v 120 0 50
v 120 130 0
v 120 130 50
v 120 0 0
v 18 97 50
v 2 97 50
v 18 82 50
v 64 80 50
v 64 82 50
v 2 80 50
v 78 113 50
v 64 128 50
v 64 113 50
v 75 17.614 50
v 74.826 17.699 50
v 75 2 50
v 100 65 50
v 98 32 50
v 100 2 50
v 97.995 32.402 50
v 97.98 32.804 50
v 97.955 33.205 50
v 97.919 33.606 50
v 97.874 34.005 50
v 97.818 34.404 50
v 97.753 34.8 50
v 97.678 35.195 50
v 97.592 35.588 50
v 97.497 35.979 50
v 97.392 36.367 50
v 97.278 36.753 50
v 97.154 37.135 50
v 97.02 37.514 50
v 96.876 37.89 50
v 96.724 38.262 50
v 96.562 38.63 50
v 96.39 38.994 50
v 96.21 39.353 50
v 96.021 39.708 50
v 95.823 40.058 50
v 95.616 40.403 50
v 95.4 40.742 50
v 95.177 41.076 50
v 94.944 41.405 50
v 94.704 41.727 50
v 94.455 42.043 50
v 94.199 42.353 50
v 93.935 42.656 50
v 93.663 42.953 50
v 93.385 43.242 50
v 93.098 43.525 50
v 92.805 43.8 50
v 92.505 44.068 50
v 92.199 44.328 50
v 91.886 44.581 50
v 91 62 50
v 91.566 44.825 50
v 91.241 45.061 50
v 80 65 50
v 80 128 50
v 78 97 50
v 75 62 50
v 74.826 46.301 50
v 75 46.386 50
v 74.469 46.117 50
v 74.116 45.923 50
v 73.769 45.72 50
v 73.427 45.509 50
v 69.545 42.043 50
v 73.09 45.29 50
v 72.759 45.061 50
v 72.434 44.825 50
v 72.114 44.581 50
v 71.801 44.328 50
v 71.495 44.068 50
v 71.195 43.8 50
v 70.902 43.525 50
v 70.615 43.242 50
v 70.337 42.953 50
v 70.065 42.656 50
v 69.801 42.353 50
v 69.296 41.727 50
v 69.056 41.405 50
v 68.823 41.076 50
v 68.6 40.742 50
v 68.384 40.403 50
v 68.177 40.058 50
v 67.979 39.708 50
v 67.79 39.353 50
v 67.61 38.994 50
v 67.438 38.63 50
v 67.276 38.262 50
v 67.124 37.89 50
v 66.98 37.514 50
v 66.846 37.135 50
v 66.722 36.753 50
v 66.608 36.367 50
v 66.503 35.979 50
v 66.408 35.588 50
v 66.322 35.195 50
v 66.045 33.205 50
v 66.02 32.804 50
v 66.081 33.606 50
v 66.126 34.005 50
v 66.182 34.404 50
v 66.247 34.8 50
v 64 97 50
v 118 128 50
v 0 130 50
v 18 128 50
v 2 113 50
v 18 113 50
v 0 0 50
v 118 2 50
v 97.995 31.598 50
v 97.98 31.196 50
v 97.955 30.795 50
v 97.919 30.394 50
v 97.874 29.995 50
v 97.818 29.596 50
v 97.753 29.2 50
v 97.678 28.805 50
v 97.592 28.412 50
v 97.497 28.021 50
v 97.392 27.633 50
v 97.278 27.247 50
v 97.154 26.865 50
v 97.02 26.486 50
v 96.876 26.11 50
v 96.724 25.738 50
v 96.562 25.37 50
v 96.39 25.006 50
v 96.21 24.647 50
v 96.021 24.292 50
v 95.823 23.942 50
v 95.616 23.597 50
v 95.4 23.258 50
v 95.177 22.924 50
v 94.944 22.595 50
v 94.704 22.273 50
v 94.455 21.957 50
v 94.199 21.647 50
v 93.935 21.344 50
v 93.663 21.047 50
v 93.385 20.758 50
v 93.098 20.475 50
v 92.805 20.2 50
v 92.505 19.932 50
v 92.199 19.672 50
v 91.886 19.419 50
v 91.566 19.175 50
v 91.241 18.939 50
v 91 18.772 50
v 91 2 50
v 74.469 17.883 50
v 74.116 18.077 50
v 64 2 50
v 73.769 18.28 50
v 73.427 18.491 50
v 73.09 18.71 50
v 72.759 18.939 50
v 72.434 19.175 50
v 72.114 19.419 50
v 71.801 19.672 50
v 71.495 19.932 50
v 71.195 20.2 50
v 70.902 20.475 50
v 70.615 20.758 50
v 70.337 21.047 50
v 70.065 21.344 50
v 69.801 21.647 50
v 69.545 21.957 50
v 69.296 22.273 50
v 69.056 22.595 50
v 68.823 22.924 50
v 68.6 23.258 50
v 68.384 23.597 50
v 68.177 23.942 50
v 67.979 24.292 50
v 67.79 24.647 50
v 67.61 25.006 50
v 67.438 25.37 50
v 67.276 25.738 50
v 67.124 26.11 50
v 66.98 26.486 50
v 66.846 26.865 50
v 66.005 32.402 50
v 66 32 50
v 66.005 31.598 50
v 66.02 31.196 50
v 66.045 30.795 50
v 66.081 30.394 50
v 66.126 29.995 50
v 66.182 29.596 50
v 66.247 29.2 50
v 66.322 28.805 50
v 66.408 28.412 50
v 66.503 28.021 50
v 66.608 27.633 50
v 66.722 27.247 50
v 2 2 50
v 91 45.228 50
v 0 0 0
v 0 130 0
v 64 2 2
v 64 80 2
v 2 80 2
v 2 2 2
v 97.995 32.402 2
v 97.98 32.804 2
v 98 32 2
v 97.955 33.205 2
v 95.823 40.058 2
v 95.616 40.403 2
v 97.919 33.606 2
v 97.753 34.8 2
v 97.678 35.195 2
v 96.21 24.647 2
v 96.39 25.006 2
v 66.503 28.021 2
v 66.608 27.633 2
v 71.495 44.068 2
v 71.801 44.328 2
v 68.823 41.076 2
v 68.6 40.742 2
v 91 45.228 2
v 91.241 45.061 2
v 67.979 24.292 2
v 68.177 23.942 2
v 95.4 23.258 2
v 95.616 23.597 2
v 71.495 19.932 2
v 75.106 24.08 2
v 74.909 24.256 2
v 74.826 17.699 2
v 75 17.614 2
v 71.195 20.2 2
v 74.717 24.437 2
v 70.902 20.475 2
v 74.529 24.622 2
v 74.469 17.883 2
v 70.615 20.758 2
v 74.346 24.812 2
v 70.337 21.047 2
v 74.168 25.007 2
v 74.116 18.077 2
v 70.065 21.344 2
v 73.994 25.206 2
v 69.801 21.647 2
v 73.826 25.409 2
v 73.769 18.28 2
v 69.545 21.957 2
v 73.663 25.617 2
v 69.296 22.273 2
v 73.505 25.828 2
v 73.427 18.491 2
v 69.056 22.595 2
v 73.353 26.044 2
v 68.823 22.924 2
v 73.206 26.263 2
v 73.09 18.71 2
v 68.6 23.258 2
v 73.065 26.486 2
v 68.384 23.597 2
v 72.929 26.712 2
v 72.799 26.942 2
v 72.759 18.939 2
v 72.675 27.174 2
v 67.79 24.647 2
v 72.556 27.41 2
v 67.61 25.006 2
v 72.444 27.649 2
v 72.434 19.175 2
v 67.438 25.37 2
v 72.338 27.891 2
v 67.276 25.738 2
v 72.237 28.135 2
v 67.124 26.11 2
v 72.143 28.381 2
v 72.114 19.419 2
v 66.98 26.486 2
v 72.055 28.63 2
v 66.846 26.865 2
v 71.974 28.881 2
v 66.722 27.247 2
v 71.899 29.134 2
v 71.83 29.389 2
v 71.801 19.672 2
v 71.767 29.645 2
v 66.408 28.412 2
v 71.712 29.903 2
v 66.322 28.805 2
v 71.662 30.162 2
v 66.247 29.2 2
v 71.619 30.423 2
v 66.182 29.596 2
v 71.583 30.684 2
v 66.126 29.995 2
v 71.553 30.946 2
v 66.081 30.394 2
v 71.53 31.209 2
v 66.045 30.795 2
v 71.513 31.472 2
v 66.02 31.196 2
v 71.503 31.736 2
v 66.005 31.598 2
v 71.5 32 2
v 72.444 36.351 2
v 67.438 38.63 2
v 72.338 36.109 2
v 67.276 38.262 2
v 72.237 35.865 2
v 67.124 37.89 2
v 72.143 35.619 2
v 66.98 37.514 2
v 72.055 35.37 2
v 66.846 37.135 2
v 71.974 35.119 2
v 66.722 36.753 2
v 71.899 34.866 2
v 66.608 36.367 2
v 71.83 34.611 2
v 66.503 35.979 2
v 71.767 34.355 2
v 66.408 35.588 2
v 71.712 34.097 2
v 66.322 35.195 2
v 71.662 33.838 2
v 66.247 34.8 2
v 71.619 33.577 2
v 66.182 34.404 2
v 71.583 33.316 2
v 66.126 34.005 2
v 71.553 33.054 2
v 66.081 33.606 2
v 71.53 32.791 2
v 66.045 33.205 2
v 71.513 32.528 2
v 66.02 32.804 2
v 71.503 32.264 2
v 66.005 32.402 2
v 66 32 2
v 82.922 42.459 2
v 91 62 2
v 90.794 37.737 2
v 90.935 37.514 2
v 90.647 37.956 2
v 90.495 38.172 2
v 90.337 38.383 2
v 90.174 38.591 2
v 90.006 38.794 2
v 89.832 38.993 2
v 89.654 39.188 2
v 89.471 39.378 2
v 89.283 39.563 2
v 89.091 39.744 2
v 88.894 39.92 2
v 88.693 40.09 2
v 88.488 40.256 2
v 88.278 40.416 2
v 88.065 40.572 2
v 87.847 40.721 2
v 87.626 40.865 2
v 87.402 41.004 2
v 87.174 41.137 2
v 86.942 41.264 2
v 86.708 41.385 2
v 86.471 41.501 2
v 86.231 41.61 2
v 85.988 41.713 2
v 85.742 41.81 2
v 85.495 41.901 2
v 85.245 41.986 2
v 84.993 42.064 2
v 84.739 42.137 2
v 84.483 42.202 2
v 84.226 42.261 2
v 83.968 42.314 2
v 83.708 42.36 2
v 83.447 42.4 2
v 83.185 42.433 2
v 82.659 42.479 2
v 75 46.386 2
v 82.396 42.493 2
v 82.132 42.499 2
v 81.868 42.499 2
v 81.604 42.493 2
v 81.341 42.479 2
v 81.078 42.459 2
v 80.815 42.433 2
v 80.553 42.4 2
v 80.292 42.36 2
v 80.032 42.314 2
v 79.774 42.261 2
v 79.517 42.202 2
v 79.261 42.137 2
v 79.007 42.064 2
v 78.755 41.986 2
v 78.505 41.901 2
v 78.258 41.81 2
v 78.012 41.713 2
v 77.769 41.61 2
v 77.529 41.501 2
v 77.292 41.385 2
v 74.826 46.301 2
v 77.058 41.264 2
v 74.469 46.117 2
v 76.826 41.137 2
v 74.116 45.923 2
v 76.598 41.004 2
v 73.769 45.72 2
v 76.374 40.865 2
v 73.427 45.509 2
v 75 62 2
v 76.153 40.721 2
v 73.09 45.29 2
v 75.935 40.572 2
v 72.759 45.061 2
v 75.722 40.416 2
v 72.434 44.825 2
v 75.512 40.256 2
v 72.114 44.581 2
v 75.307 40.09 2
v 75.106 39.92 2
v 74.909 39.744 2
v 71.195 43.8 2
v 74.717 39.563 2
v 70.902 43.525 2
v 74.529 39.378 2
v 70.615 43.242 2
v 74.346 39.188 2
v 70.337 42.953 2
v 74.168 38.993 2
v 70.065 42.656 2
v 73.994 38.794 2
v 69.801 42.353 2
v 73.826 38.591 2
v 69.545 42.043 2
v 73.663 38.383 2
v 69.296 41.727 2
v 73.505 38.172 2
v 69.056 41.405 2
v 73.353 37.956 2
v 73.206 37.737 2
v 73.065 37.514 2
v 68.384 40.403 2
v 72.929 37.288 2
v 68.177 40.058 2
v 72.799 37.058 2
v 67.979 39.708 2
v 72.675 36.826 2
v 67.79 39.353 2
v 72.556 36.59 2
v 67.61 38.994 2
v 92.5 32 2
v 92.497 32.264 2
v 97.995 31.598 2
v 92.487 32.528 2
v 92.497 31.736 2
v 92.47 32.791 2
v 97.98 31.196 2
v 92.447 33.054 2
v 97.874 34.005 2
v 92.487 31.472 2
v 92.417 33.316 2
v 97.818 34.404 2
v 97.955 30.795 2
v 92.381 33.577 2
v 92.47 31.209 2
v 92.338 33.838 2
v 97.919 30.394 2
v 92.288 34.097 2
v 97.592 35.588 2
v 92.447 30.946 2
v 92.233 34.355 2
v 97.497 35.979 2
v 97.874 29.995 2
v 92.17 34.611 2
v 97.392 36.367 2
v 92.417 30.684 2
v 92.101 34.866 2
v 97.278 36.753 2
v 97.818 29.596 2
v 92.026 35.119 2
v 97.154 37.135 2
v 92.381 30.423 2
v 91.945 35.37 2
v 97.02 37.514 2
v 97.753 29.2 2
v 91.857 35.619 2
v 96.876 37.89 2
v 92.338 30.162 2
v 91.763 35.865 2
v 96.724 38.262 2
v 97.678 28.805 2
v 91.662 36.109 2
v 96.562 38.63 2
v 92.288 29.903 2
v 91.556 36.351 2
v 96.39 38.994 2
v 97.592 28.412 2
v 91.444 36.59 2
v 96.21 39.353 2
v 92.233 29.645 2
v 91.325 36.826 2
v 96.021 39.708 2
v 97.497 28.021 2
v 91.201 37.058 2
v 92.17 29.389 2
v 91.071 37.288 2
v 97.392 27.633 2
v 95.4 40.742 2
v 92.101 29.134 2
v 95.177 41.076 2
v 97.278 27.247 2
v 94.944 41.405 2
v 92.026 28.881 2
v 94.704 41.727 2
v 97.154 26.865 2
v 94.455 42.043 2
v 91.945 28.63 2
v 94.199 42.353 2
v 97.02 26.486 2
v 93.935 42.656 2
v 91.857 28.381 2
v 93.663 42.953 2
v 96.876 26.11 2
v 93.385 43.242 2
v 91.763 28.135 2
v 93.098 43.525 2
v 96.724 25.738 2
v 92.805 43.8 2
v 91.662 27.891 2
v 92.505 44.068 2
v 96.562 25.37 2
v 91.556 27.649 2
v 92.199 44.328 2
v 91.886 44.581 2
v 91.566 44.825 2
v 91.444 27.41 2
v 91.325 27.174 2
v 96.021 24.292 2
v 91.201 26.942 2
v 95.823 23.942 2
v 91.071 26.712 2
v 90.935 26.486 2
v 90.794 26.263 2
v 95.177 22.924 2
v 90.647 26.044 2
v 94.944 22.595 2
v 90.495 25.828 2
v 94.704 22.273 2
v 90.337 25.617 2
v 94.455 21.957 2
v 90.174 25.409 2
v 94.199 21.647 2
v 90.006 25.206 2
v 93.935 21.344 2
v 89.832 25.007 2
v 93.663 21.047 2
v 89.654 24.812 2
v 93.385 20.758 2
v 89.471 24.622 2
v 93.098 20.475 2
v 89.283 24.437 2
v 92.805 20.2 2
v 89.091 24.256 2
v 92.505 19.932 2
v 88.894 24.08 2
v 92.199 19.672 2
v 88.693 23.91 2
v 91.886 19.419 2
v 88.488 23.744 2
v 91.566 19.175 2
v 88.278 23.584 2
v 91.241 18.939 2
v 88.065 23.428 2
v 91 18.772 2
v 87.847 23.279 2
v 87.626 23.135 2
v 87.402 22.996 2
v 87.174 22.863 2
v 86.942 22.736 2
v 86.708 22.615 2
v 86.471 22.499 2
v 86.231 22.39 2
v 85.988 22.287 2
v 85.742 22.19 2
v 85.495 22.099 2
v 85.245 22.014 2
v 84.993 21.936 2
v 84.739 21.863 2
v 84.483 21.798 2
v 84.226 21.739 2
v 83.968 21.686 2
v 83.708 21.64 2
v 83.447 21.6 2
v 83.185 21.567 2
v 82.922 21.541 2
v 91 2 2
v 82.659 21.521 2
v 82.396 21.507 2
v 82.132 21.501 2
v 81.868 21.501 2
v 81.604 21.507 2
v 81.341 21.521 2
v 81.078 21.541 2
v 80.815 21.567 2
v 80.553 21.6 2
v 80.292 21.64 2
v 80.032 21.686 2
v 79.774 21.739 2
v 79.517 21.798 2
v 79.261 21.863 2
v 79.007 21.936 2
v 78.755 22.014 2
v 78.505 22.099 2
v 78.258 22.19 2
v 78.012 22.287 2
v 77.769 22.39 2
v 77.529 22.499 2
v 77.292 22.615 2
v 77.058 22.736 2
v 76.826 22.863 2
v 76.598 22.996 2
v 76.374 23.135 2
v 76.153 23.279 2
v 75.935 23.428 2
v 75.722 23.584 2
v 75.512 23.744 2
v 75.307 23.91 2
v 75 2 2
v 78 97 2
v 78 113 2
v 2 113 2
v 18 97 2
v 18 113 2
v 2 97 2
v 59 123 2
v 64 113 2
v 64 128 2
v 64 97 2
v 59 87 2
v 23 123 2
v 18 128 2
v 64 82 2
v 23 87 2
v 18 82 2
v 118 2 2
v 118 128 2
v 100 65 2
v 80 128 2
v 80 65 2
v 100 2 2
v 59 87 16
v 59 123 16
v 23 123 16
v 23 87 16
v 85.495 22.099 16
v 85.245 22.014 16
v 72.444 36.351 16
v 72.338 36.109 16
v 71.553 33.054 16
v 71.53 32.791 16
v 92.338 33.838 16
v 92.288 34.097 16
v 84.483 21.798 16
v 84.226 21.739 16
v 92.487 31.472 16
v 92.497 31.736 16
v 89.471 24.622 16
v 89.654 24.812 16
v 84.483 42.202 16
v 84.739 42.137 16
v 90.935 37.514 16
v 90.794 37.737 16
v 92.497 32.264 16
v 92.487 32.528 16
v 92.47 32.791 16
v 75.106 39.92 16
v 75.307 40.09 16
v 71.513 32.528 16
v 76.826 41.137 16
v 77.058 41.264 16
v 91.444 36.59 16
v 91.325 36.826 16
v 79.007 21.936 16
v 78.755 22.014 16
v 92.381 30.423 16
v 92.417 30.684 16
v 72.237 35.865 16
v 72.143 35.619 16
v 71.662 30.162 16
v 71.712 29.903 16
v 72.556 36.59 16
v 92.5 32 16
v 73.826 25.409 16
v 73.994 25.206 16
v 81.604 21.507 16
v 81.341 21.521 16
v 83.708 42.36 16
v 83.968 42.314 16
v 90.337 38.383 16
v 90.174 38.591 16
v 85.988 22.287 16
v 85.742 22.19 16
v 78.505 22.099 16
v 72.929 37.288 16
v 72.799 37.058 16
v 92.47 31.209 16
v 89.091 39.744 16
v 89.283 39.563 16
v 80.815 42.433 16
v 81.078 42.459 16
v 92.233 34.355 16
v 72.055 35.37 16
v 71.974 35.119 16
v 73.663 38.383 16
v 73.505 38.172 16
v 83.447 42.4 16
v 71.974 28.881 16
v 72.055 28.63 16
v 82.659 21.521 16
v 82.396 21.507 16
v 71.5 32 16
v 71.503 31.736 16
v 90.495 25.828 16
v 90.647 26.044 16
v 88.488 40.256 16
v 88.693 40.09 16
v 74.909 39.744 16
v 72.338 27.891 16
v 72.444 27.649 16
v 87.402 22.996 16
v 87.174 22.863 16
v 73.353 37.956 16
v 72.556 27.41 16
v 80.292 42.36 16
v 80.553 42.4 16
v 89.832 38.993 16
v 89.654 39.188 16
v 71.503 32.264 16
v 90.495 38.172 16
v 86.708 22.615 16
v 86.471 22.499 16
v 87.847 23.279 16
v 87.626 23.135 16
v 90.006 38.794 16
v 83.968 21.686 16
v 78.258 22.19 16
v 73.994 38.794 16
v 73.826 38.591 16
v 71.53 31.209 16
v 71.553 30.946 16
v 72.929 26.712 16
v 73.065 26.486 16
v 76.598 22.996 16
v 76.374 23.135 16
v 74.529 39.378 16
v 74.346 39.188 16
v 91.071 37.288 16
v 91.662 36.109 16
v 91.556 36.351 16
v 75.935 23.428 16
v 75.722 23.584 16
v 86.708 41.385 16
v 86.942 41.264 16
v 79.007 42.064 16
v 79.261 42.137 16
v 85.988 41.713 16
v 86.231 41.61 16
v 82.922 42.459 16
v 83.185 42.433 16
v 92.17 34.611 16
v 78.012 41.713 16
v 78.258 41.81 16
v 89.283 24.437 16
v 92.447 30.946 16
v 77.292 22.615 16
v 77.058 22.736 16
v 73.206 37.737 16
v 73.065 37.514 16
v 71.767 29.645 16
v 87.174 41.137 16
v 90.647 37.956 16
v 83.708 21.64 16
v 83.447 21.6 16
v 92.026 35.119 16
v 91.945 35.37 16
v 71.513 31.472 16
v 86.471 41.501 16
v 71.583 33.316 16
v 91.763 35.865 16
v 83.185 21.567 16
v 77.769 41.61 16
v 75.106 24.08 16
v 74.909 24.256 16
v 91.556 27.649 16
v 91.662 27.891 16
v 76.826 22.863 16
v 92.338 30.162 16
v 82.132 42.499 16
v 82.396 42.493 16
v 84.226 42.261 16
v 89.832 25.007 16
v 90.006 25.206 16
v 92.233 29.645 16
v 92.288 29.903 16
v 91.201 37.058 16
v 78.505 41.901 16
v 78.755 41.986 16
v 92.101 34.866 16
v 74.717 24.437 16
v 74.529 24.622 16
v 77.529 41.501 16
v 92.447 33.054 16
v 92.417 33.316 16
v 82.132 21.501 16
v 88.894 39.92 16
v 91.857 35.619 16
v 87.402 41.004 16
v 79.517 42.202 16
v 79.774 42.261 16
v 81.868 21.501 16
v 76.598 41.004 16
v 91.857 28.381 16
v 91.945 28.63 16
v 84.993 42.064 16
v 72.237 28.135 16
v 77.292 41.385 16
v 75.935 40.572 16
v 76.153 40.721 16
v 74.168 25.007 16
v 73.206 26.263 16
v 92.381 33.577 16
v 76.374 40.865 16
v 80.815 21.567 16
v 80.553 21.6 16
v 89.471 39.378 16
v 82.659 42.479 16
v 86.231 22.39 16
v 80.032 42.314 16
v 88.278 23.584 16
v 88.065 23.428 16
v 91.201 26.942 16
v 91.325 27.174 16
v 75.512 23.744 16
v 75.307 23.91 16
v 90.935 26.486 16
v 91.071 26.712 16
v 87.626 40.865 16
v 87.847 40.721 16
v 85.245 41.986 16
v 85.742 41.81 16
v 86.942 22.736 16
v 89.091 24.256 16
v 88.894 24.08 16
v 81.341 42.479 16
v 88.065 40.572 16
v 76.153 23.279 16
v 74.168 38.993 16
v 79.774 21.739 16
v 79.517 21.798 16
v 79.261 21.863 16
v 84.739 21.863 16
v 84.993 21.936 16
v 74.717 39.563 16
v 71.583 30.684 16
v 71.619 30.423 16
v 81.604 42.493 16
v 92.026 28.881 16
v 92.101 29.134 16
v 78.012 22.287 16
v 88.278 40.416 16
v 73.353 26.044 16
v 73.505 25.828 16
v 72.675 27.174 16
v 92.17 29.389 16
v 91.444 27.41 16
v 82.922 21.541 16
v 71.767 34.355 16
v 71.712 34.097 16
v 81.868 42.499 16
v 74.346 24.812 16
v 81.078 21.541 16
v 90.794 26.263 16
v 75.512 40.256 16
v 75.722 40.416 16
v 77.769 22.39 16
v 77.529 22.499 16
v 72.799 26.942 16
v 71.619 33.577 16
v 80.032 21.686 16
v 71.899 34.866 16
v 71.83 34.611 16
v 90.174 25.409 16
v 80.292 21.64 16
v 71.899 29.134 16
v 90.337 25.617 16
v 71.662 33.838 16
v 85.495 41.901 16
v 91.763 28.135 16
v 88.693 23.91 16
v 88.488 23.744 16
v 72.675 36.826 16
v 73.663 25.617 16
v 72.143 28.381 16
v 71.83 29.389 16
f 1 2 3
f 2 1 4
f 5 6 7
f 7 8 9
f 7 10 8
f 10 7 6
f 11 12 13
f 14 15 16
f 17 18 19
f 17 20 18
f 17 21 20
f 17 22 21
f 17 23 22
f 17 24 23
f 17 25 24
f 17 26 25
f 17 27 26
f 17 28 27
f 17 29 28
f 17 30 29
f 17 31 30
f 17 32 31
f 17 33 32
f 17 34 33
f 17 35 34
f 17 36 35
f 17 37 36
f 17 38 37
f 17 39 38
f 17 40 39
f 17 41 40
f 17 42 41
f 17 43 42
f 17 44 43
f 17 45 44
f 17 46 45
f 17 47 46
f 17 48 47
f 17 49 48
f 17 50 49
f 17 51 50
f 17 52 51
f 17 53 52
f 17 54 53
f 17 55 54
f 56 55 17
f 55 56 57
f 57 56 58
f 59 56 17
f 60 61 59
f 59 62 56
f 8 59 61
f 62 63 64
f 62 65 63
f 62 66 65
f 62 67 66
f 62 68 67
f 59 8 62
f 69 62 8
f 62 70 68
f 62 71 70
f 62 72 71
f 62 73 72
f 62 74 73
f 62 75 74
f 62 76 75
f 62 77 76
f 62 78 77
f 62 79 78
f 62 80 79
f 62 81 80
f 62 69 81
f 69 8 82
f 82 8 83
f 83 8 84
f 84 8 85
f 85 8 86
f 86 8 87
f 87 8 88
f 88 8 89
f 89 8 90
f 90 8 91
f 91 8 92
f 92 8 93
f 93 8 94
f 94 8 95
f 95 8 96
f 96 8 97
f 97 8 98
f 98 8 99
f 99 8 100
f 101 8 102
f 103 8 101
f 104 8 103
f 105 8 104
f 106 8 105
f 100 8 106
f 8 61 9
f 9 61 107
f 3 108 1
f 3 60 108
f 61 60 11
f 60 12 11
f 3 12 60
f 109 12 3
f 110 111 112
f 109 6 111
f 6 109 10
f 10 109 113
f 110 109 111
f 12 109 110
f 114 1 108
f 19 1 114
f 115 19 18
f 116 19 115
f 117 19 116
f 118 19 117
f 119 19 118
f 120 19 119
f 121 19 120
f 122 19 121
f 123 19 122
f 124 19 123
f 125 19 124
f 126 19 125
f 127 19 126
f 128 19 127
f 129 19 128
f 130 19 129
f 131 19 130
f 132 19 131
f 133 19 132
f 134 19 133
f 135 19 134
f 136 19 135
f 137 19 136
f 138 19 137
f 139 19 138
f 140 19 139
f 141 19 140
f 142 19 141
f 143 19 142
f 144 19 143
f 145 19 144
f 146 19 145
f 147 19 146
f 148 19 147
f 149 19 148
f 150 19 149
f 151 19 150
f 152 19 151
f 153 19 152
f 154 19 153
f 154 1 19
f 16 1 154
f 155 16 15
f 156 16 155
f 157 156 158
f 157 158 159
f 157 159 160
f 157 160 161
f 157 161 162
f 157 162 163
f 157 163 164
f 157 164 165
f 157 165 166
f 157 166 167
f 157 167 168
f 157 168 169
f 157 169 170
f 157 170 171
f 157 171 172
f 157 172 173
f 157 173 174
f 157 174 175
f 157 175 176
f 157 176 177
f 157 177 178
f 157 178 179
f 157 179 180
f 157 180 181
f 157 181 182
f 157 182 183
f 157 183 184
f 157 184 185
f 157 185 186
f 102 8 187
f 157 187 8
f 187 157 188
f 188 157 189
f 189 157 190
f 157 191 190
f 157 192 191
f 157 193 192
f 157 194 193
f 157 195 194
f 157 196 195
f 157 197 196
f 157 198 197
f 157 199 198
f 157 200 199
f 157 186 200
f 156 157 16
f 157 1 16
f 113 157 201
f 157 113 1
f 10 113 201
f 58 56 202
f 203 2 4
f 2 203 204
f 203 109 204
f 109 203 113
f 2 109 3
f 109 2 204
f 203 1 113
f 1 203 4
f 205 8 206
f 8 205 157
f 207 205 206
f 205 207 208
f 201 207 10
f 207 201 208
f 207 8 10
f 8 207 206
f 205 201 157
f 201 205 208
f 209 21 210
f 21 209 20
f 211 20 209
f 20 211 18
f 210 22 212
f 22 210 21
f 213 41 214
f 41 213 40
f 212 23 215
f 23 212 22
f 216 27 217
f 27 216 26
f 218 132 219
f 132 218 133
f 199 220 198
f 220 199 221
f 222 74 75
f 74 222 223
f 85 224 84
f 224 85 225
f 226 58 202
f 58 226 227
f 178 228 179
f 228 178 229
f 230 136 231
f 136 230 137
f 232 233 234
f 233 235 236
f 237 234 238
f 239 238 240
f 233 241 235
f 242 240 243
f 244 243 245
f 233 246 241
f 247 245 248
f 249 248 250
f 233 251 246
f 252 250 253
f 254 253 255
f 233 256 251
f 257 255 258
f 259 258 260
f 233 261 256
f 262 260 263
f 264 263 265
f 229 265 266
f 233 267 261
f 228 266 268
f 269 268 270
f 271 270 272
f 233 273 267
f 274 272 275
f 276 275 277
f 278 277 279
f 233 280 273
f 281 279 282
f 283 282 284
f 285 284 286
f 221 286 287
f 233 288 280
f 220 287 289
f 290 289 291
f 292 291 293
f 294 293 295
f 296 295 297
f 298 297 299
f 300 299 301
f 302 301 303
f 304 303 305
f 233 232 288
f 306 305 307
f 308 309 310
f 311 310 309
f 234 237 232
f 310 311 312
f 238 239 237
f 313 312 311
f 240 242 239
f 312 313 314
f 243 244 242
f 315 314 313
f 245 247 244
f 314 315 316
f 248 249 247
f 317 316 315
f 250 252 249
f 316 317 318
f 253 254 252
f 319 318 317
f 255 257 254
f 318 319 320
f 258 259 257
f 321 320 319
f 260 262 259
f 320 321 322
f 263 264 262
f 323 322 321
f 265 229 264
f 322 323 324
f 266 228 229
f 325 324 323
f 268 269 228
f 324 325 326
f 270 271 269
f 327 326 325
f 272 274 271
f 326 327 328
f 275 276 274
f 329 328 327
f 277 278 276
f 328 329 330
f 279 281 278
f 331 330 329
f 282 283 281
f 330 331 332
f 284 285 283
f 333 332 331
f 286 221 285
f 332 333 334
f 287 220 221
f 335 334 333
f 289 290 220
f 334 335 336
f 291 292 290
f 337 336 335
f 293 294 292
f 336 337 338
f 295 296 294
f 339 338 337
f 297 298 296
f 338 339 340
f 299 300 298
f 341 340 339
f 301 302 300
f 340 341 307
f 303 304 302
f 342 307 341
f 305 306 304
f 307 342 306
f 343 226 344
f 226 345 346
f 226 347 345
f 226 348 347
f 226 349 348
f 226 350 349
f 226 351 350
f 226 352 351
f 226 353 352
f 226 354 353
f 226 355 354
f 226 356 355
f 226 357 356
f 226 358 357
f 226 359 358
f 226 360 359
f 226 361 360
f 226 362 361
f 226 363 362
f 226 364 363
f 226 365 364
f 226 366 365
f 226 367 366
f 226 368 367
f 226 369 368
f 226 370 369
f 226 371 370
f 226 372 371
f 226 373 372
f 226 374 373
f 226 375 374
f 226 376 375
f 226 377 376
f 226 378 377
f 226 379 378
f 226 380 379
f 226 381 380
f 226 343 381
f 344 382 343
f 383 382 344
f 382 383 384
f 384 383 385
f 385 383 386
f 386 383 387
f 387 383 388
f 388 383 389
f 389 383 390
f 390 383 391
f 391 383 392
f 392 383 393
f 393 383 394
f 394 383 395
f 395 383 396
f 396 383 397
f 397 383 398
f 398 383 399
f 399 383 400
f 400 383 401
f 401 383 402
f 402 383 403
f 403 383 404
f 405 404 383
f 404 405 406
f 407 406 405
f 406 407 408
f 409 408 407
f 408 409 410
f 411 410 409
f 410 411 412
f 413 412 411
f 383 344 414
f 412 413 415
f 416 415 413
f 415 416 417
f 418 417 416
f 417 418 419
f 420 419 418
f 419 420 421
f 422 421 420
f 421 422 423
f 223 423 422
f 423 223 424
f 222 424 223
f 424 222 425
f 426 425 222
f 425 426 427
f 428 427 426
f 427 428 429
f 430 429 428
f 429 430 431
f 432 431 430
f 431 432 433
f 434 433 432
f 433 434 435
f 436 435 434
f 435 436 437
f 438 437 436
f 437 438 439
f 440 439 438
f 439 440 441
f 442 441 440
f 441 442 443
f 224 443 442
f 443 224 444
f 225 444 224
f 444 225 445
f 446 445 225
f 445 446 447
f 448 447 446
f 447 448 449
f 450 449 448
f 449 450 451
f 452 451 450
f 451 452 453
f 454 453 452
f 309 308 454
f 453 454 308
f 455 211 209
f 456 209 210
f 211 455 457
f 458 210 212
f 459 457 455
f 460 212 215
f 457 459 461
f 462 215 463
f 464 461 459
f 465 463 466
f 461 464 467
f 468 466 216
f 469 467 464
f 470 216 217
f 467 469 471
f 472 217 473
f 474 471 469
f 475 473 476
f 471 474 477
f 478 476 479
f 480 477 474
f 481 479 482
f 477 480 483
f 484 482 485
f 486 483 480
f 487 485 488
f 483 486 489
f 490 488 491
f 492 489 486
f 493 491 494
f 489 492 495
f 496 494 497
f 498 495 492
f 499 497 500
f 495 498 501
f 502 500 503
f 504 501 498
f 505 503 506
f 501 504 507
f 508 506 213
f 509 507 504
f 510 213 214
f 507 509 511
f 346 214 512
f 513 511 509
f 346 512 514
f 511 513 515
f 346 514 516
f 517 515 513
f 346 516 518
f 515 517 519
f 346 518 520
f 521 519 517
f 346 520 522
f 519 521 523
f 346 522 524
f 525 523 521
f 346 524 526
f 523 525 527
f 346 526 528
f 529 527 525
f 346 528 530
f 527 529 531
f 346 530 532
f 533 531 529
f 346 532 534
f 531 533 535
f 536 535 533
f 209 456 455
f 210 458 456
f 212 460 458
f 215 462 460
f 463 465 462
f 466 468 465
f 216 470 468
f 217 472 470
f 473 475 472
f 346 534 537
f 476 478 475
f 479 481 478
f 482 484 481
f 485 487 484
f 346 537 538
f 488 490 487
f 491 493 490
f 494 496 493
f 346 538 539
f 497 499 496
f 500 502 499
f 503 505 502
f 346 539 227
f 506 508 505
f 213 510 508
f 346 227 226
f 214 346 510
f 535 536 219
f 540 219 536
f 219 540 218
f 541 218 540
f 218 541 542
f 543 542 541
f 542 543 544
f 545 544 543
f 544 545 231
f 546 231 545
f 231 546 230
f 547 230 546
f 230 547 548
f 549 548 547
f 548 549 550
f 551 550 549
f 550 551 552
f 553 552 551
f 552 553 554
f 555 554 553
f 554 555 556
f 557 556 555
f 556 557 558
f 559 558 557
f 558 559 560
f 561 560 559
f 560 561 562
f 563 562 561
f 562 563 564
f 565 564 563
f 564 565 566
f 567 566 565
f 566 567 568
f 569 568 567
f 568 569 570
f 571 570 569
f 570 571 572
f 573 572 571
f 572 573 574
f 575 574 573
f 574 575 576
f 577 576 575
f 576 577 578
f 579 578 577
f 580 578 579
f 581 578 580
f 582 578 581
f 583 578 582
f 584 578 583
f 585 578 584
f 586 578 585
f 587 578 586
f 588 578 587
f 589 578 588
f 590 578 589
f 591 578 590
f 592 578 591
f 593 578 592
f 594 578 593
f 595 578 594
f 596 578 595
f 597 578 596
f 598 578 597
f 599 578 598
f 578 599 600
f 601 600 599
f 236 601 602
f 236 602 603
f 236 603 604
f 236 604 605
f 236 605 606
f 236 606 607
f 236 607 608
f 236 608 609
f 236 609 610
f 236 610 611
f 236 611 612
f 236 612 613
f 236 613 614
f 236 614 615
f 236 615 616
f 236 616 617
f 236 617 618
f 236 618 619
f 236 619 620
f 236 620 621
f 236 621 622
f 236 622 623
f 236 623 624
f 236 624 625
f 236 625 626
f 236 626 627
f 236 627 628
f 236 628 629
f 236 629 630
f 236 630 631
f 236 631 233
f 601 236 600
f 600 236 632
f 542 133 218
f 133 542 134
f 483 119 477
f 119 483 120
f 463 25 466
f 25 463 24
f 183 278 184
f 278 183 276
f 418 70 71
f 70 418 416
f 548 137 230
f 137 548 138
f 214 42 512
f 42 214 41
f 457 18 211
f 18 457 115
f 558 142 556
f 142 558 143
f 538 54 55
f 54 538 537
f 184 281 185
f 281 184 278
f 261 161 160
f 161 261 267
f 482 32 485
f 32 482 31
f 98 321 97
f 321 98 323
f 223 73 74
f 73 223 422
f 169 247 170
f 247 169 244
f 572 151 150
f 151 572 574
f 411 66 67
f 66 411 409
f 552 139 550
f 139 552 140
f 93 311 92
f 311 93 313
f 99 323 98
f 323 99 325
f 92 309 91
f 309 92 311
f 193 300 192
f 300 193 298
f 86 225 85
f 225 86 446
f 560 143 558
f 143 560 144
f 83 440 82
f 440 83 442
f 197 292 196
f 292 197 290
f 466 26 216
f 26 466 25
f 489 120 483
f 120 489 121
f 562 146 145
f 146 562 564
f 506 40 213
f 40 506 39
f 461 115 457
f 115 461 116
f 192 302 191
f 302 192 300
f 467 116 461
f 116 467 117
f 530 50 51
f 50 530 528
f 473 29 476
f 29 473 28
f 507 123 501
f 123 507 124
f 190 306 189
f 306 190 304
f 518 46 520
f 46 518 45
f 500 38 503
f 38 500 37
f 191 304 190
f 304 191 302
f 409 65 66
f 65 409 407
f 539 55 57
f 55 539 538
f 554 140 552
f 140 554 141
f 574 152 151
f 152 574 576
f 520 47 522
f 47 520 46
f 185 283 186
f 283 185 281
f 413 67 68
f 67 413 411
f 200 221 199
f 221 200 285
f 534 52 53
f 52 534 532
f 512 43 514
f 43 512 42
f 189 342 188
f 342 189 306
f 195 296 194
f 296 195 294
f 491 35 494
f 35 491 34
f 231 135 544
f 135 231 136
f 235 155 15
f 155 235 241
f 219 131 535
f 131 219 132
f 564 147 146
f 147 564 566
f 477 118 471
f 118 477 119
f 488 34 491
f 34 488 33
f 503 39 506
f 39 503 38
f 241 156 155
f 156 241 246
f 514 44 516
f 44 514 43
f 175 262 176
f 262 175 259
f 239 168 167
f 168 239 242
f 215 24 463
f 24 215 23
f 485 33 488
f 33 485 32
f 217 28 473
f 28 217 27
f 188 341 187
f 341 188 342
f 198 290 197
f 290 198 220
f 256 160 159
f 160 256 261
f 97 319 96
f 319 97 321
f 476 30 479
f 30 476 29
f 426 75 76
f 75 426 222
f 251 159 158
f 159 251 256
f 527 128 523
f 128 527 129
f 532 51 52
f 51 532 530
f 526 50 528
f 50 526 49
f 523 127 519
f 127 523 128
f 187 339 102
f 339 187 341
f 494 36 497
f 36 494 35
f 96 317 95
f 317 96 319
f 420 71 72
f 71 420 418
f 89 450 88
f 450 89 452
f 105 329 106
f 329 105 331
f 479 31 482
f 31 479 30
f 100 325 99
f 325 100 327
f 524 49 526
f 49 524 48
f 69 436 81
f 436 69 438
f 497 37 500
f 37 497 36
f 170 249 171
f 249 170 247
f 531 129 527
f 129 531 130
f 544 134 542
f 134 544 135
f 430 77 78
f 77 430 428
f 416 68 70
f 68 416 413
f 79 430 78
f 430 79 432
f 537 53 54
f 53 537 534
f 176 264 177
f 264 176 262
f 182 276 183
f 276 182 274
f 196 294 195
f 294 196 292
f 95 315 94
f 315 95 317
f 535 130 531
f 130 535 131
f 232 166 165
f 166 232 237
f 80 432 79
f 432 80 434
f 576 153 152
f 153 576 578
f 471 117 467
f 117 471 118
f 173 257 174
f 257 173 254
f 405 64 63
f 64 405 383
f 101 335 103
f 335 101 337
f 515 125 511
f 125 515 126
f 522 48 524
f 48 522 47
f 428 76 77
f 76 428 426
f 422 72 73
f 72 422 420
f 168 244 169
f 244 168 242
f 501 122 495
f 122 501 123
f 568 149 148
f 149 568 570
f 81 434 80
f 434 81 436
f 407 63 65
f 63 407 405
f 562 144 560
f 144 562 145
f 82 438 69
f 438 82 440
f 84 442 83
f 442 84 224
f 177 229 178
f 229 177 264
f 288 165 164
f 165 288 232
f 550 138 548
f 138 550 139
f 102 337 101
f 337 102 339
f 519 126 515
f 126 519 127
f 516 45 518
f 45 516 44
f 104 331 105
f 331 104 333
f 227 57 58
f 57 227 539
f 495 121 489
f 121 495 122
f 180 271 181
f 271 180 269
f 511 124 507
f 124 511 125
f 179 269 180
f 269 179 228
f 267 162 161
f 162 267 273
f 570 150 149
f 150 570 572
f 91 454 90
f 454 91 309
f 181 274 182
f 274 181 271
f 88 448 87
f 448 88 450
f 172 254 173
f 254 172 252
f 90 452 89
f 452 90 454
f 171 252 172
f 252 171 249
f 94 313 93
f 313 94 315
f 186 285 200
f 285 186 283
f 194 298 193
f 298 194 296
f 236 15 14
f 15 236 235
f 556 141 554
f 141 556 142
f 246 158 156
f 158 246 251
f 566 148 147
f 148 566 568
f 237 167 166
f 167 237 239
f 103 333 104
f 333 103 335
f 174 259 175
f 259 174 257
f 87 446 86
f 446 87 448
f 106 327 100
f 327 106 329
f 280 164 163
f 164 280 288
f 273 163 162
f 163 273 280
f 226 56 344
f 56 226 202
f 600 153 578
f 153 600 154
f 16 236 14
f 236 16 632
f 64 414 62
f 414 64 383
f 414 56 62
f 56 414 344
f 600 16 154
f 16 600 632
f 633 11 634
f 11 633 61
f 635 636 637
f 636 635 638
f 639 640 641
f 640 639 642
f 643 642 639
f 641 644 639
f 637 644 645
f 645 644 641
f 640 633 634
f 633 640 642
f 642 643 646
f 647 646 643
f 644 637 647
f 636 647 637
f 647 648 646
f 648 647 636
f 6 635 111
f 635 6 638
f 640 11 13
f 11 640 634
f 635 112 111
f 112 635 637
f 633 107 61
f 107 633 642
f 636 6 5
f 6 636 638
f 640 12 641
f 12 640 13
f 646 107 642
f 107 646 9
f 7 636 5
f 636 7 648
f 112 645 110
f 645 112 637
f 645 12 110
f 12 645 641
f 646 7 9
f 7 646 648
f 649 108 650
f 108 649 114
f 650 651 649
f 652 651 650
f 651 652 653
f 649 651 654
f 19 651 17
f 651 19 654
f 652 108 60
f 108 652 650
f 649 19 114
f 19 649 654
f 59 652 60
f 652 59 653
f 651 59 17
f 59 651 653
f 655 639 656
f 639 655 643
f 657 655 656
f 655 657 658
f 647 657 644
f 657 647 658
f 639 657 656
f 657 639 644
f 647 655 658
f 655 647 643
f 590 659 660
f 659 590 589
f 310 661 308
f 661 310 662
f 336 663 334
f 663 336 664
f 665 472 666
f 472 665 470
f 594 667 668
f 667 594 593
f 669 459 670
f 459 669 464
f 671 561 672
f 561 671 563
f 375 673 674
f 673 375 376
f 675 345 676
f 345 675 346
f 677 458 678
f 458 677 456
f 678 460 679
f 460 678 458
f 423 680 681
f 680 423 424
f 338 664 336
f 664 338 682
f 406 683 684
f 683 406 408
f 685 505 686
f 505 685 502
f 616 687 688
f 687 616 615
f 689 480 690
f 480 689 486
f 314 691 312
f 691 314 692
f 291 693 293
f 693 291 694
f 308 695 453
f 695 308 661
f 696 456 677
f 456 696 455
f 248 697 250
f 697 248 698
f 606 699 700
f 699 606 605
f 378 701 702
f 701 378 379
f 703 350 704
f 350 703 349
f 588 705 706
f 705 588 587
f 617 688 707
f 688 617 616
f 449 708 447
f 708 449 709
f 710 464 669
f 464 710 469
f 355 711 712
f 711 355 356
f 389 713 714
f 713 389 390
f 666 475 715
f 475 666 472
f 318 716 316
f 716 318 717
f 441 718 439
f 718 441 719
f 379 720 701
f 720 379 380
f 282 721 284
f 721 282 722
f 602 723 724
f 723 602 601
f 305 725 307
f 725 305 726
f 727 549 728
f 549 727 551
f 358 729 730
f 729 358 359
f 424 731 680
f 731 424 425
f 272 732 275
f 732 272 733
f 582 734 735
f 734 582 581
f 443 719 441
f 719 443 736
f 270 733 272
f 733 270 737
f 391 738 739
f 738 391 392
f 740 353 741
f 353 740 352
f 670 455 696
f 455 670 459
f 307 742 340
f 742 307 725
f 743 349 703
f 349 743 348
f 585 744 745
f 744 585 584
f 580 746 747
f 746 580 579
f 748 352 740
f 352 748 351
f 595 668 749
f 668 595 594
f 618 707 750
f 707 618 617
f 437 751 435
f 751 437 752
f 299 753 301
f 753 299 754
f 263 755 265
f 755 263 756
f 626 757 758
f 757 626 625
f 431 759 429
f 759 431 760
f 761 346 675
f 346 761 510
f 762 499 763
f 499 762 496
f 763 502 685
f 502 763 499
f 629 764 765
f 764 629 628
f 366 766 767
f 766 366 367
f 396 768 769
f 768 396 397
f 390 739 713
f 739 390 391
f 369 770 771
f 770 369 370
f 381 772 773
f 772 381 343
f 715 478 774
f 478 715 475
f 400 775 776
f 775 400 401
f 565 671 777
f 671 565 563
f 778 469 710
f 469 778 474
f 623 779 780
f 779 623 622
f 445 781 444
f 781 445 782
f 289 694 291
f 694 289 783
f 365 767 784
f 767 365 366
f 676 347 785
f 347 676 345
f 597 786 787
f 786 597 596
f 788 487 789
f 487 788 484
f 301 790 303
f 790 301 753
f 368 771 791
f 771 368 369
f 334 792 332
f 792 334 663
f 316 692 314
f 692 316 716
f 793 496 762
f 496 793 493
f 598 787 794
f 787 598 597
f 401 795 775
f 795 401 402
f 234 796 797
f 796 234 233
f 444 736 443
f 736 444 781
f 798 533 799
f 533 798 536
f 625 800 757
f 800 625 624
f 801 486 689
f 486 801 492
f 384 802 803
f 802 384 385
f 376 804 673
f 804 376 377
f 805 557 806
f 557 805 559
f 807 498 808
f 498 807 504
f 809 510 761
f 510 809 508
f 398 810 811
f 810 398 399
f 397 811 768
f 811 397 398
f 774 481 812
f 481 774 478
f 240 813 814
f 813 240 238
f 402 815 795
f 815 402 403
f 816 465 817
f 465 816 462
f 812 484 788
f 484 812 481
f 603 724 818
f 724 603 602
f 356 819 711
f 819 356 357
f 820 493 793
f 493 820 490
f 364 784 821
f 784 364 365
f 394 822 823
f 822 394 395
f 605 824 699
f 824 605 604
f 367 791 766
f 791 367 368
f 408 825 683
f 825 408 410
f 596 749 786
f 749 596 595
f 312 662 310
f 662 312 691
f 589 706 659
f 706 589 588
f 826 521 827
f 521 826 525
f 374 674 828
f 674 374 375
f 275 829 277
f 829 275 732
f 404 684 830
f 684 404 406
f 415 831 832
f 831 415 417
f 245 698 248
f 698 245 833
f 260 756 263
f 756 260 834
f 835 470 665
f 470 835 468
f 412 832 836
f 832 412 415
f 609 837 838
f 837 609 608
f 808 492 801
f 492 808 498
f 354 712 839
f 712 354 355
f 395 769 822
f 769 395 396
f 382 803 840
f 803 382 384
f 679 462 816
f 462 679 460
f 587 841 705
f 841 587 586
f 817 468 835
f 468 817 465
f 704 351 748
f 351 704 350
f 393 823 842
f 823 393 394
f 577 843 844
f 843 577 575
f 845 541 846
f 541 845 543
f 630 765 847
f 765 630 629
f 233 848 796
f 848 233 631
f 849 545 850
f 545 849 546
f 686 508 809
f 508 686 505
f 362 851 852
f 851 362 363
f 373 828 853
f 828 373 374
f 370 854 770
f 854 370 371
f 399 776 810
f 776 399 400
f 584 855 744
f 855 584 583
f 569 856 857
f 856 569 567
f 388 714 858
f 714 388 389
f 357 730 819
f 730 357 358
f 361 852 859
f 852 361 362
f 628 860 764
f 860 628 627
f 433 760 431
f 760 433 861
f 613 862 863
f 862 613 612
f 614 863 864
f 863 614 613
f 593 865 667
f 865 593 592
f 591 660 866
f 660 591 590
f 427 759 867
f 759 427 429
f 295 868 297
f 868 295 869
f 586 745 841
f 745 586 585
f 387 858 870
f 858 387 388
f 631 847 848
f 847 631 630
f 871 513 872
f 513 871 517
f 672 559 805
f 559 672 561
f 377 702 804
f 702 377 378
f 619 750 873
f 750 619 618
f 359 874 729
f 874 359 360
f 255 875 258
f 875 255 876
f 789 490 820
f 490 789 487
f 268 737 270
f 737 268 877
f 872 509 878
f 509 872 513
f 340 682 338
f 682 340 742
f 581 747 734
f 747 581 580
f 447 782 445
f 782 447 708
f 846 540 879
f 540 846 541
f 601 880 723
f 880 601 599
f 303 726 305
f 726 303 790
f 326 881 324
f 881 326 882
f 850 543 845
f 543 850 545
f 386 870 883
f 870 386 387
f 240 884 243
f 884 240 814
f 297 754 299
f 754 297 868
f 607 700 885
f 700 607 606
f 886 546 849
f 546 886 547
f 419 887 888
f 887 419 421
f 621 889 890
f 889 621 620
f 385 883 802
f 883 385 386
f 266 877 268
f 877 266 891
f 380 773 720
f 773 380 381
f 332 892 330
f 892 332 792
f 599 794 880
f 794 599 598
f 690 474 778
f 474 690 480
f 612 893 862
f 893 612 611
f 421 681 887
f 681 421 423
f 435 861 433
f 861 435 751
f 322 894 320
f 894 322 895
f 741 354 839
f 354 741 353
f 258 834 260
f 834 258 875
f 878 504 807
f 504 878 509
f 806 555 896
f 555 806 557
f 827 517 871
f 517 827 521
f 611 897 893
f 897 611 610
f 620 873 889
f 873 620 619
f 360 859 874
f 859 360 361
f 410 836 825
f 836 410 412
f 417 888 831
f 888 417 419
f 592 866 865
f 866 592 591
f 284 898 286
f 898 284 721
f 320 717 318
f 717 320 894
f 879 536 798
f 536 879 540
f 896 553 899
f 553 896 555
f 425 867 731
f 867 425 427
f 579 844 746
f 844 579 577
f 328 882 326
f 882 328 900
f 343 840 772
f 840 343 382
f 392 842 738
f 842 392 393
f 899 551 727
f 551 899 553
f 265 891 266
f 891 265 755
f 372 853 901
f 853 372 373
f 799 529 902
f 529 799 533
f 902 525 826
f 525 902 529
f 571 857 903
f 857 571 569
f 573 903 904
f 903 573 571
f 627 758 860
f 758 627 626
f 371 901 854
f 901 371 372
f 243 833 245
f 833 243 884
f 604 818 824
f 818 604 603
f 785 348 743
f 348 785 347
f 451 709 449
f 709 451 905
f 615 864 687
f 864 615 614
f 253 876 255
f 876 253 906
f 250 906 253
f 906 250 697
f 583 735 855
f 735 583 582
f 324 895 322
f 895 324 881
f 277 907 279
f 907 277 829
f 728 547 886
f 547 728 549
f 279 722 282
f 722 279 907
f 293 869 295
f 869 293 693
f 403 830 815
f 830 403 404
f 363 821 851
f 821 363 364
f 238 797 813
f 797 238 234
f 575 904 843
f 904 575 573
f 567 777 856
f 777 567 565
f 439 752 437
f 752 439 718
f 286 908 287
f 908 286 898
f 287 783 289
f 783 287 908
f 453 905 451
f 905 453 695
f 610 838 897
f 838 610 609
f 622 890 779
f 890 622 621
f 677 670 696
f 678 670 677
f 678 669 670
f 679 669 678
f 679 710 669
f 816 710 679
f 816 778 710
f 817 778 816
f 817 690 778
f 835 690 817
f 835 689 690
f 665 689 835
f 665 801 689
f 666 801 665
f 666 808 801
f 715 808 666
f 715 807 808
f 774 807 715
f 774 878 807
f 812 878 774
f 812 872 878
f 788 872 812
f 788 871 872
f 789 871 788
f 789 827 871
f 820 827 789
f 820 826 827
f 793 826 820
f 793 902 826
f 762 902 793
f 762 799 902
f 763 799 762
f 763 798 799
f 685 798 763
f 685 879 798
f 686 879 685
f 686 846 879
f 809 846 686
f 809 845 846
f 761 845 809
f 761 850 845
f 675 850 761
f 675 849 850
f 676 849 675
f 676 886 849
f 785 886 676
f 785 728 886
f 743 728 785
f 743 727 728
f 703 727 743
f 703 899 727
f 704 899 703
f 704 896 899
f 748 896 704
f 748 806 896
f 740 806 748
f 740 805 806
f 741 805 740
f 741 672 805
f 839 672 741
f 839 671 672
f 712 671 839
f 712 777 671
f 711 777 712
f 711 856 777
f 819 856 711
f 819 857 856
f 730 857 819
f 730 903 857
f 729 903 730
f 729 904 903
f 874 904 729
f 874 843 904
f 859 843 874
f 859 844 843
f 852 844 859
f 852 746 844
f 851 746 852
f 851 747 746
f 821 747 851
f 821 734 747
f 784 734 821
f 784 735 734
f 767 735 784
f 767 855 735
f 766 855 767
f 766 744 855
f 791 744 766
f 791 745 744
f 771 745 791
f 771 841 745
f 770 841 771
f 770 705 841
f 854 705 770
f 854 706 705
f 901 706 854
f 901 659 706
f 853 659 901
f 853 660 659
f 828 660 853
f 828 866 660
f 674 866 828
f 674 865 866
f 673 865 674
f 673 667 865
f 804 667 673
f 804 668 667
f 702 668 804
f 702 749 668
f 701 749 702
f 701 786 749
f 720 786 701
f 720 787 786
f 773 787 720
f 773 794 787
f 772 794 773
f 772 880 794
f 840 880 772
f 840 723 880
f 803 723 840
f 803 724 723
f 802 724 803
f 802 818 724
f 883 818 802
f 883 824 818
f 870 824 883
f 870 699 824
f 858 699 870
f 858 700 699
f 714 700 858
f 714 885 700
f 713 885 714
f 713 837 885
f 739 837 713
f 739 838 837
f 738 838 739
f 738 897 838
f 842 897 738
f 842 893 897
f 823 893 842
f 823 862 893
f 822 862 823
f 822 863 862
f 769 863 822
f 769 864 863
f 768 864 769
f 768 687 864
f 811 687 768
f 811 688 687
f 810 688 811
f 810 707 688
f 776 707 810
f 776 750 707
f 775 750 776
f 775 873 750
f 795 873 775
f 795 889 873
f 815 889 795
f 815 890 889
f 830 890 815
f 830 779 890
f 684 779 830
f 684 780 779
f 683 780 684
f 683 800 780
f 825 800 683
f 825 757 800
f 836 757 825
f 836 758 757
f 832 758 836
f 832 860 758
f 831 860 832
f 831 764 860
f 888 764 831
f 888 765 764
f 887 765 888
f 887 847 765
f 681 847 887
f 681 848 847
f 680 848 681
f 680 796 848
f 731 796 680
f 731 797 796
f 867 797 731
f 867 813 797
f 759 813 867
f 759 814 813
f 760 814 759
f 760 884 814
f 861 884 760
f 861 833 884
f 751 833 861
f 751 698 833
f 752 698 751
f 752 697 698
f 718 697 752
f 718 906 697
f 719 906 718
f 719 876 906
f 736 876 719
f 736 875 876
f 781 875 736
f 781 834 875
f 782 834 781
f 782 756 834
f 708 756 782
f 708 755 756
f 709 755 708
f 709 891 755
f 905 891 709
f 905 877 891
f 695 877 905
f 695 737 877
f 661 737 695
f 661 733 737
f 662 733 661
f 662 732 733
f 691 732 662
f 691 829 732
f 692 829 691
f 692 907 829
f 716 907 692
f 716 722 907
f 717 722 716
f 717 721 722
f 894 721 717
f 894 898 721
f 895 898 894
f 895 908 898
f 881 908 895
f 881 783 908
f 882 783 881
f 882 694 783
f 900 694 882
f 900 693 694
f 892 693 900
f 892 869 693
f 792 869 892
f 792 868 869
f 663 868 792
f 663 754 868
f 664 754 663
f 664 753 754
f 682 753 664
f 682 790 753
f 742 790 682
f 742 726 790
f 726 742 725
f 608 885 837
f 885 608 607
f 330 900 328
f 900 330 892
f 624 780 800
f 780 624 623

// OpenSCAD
$fn=250;

difference()
{
    cube([120,130,50]);

    // Diamonds
    translate([2,2,2])
        cube([62,78,50]);
    // Guests round
    translate([82,32,2])
        cylinder(d=32,h=50);
    translate([75,2,2])
        cube([16,60,50]);
    // Guests square
    translate([2,97,2])
        cube([76,16,50]);
    translate([18,82,2])
        cube([46,46,50]);
    // Guests figures & dice
    translate([100,2,2])
        cube([18,126,50]);
    translate([80,65,2])
        cube([21,63,50]);
}
translate([23,87,2])
    cube([36,36,14]);
translate([82,32,2])
    cylinder(d=21,h=14);
